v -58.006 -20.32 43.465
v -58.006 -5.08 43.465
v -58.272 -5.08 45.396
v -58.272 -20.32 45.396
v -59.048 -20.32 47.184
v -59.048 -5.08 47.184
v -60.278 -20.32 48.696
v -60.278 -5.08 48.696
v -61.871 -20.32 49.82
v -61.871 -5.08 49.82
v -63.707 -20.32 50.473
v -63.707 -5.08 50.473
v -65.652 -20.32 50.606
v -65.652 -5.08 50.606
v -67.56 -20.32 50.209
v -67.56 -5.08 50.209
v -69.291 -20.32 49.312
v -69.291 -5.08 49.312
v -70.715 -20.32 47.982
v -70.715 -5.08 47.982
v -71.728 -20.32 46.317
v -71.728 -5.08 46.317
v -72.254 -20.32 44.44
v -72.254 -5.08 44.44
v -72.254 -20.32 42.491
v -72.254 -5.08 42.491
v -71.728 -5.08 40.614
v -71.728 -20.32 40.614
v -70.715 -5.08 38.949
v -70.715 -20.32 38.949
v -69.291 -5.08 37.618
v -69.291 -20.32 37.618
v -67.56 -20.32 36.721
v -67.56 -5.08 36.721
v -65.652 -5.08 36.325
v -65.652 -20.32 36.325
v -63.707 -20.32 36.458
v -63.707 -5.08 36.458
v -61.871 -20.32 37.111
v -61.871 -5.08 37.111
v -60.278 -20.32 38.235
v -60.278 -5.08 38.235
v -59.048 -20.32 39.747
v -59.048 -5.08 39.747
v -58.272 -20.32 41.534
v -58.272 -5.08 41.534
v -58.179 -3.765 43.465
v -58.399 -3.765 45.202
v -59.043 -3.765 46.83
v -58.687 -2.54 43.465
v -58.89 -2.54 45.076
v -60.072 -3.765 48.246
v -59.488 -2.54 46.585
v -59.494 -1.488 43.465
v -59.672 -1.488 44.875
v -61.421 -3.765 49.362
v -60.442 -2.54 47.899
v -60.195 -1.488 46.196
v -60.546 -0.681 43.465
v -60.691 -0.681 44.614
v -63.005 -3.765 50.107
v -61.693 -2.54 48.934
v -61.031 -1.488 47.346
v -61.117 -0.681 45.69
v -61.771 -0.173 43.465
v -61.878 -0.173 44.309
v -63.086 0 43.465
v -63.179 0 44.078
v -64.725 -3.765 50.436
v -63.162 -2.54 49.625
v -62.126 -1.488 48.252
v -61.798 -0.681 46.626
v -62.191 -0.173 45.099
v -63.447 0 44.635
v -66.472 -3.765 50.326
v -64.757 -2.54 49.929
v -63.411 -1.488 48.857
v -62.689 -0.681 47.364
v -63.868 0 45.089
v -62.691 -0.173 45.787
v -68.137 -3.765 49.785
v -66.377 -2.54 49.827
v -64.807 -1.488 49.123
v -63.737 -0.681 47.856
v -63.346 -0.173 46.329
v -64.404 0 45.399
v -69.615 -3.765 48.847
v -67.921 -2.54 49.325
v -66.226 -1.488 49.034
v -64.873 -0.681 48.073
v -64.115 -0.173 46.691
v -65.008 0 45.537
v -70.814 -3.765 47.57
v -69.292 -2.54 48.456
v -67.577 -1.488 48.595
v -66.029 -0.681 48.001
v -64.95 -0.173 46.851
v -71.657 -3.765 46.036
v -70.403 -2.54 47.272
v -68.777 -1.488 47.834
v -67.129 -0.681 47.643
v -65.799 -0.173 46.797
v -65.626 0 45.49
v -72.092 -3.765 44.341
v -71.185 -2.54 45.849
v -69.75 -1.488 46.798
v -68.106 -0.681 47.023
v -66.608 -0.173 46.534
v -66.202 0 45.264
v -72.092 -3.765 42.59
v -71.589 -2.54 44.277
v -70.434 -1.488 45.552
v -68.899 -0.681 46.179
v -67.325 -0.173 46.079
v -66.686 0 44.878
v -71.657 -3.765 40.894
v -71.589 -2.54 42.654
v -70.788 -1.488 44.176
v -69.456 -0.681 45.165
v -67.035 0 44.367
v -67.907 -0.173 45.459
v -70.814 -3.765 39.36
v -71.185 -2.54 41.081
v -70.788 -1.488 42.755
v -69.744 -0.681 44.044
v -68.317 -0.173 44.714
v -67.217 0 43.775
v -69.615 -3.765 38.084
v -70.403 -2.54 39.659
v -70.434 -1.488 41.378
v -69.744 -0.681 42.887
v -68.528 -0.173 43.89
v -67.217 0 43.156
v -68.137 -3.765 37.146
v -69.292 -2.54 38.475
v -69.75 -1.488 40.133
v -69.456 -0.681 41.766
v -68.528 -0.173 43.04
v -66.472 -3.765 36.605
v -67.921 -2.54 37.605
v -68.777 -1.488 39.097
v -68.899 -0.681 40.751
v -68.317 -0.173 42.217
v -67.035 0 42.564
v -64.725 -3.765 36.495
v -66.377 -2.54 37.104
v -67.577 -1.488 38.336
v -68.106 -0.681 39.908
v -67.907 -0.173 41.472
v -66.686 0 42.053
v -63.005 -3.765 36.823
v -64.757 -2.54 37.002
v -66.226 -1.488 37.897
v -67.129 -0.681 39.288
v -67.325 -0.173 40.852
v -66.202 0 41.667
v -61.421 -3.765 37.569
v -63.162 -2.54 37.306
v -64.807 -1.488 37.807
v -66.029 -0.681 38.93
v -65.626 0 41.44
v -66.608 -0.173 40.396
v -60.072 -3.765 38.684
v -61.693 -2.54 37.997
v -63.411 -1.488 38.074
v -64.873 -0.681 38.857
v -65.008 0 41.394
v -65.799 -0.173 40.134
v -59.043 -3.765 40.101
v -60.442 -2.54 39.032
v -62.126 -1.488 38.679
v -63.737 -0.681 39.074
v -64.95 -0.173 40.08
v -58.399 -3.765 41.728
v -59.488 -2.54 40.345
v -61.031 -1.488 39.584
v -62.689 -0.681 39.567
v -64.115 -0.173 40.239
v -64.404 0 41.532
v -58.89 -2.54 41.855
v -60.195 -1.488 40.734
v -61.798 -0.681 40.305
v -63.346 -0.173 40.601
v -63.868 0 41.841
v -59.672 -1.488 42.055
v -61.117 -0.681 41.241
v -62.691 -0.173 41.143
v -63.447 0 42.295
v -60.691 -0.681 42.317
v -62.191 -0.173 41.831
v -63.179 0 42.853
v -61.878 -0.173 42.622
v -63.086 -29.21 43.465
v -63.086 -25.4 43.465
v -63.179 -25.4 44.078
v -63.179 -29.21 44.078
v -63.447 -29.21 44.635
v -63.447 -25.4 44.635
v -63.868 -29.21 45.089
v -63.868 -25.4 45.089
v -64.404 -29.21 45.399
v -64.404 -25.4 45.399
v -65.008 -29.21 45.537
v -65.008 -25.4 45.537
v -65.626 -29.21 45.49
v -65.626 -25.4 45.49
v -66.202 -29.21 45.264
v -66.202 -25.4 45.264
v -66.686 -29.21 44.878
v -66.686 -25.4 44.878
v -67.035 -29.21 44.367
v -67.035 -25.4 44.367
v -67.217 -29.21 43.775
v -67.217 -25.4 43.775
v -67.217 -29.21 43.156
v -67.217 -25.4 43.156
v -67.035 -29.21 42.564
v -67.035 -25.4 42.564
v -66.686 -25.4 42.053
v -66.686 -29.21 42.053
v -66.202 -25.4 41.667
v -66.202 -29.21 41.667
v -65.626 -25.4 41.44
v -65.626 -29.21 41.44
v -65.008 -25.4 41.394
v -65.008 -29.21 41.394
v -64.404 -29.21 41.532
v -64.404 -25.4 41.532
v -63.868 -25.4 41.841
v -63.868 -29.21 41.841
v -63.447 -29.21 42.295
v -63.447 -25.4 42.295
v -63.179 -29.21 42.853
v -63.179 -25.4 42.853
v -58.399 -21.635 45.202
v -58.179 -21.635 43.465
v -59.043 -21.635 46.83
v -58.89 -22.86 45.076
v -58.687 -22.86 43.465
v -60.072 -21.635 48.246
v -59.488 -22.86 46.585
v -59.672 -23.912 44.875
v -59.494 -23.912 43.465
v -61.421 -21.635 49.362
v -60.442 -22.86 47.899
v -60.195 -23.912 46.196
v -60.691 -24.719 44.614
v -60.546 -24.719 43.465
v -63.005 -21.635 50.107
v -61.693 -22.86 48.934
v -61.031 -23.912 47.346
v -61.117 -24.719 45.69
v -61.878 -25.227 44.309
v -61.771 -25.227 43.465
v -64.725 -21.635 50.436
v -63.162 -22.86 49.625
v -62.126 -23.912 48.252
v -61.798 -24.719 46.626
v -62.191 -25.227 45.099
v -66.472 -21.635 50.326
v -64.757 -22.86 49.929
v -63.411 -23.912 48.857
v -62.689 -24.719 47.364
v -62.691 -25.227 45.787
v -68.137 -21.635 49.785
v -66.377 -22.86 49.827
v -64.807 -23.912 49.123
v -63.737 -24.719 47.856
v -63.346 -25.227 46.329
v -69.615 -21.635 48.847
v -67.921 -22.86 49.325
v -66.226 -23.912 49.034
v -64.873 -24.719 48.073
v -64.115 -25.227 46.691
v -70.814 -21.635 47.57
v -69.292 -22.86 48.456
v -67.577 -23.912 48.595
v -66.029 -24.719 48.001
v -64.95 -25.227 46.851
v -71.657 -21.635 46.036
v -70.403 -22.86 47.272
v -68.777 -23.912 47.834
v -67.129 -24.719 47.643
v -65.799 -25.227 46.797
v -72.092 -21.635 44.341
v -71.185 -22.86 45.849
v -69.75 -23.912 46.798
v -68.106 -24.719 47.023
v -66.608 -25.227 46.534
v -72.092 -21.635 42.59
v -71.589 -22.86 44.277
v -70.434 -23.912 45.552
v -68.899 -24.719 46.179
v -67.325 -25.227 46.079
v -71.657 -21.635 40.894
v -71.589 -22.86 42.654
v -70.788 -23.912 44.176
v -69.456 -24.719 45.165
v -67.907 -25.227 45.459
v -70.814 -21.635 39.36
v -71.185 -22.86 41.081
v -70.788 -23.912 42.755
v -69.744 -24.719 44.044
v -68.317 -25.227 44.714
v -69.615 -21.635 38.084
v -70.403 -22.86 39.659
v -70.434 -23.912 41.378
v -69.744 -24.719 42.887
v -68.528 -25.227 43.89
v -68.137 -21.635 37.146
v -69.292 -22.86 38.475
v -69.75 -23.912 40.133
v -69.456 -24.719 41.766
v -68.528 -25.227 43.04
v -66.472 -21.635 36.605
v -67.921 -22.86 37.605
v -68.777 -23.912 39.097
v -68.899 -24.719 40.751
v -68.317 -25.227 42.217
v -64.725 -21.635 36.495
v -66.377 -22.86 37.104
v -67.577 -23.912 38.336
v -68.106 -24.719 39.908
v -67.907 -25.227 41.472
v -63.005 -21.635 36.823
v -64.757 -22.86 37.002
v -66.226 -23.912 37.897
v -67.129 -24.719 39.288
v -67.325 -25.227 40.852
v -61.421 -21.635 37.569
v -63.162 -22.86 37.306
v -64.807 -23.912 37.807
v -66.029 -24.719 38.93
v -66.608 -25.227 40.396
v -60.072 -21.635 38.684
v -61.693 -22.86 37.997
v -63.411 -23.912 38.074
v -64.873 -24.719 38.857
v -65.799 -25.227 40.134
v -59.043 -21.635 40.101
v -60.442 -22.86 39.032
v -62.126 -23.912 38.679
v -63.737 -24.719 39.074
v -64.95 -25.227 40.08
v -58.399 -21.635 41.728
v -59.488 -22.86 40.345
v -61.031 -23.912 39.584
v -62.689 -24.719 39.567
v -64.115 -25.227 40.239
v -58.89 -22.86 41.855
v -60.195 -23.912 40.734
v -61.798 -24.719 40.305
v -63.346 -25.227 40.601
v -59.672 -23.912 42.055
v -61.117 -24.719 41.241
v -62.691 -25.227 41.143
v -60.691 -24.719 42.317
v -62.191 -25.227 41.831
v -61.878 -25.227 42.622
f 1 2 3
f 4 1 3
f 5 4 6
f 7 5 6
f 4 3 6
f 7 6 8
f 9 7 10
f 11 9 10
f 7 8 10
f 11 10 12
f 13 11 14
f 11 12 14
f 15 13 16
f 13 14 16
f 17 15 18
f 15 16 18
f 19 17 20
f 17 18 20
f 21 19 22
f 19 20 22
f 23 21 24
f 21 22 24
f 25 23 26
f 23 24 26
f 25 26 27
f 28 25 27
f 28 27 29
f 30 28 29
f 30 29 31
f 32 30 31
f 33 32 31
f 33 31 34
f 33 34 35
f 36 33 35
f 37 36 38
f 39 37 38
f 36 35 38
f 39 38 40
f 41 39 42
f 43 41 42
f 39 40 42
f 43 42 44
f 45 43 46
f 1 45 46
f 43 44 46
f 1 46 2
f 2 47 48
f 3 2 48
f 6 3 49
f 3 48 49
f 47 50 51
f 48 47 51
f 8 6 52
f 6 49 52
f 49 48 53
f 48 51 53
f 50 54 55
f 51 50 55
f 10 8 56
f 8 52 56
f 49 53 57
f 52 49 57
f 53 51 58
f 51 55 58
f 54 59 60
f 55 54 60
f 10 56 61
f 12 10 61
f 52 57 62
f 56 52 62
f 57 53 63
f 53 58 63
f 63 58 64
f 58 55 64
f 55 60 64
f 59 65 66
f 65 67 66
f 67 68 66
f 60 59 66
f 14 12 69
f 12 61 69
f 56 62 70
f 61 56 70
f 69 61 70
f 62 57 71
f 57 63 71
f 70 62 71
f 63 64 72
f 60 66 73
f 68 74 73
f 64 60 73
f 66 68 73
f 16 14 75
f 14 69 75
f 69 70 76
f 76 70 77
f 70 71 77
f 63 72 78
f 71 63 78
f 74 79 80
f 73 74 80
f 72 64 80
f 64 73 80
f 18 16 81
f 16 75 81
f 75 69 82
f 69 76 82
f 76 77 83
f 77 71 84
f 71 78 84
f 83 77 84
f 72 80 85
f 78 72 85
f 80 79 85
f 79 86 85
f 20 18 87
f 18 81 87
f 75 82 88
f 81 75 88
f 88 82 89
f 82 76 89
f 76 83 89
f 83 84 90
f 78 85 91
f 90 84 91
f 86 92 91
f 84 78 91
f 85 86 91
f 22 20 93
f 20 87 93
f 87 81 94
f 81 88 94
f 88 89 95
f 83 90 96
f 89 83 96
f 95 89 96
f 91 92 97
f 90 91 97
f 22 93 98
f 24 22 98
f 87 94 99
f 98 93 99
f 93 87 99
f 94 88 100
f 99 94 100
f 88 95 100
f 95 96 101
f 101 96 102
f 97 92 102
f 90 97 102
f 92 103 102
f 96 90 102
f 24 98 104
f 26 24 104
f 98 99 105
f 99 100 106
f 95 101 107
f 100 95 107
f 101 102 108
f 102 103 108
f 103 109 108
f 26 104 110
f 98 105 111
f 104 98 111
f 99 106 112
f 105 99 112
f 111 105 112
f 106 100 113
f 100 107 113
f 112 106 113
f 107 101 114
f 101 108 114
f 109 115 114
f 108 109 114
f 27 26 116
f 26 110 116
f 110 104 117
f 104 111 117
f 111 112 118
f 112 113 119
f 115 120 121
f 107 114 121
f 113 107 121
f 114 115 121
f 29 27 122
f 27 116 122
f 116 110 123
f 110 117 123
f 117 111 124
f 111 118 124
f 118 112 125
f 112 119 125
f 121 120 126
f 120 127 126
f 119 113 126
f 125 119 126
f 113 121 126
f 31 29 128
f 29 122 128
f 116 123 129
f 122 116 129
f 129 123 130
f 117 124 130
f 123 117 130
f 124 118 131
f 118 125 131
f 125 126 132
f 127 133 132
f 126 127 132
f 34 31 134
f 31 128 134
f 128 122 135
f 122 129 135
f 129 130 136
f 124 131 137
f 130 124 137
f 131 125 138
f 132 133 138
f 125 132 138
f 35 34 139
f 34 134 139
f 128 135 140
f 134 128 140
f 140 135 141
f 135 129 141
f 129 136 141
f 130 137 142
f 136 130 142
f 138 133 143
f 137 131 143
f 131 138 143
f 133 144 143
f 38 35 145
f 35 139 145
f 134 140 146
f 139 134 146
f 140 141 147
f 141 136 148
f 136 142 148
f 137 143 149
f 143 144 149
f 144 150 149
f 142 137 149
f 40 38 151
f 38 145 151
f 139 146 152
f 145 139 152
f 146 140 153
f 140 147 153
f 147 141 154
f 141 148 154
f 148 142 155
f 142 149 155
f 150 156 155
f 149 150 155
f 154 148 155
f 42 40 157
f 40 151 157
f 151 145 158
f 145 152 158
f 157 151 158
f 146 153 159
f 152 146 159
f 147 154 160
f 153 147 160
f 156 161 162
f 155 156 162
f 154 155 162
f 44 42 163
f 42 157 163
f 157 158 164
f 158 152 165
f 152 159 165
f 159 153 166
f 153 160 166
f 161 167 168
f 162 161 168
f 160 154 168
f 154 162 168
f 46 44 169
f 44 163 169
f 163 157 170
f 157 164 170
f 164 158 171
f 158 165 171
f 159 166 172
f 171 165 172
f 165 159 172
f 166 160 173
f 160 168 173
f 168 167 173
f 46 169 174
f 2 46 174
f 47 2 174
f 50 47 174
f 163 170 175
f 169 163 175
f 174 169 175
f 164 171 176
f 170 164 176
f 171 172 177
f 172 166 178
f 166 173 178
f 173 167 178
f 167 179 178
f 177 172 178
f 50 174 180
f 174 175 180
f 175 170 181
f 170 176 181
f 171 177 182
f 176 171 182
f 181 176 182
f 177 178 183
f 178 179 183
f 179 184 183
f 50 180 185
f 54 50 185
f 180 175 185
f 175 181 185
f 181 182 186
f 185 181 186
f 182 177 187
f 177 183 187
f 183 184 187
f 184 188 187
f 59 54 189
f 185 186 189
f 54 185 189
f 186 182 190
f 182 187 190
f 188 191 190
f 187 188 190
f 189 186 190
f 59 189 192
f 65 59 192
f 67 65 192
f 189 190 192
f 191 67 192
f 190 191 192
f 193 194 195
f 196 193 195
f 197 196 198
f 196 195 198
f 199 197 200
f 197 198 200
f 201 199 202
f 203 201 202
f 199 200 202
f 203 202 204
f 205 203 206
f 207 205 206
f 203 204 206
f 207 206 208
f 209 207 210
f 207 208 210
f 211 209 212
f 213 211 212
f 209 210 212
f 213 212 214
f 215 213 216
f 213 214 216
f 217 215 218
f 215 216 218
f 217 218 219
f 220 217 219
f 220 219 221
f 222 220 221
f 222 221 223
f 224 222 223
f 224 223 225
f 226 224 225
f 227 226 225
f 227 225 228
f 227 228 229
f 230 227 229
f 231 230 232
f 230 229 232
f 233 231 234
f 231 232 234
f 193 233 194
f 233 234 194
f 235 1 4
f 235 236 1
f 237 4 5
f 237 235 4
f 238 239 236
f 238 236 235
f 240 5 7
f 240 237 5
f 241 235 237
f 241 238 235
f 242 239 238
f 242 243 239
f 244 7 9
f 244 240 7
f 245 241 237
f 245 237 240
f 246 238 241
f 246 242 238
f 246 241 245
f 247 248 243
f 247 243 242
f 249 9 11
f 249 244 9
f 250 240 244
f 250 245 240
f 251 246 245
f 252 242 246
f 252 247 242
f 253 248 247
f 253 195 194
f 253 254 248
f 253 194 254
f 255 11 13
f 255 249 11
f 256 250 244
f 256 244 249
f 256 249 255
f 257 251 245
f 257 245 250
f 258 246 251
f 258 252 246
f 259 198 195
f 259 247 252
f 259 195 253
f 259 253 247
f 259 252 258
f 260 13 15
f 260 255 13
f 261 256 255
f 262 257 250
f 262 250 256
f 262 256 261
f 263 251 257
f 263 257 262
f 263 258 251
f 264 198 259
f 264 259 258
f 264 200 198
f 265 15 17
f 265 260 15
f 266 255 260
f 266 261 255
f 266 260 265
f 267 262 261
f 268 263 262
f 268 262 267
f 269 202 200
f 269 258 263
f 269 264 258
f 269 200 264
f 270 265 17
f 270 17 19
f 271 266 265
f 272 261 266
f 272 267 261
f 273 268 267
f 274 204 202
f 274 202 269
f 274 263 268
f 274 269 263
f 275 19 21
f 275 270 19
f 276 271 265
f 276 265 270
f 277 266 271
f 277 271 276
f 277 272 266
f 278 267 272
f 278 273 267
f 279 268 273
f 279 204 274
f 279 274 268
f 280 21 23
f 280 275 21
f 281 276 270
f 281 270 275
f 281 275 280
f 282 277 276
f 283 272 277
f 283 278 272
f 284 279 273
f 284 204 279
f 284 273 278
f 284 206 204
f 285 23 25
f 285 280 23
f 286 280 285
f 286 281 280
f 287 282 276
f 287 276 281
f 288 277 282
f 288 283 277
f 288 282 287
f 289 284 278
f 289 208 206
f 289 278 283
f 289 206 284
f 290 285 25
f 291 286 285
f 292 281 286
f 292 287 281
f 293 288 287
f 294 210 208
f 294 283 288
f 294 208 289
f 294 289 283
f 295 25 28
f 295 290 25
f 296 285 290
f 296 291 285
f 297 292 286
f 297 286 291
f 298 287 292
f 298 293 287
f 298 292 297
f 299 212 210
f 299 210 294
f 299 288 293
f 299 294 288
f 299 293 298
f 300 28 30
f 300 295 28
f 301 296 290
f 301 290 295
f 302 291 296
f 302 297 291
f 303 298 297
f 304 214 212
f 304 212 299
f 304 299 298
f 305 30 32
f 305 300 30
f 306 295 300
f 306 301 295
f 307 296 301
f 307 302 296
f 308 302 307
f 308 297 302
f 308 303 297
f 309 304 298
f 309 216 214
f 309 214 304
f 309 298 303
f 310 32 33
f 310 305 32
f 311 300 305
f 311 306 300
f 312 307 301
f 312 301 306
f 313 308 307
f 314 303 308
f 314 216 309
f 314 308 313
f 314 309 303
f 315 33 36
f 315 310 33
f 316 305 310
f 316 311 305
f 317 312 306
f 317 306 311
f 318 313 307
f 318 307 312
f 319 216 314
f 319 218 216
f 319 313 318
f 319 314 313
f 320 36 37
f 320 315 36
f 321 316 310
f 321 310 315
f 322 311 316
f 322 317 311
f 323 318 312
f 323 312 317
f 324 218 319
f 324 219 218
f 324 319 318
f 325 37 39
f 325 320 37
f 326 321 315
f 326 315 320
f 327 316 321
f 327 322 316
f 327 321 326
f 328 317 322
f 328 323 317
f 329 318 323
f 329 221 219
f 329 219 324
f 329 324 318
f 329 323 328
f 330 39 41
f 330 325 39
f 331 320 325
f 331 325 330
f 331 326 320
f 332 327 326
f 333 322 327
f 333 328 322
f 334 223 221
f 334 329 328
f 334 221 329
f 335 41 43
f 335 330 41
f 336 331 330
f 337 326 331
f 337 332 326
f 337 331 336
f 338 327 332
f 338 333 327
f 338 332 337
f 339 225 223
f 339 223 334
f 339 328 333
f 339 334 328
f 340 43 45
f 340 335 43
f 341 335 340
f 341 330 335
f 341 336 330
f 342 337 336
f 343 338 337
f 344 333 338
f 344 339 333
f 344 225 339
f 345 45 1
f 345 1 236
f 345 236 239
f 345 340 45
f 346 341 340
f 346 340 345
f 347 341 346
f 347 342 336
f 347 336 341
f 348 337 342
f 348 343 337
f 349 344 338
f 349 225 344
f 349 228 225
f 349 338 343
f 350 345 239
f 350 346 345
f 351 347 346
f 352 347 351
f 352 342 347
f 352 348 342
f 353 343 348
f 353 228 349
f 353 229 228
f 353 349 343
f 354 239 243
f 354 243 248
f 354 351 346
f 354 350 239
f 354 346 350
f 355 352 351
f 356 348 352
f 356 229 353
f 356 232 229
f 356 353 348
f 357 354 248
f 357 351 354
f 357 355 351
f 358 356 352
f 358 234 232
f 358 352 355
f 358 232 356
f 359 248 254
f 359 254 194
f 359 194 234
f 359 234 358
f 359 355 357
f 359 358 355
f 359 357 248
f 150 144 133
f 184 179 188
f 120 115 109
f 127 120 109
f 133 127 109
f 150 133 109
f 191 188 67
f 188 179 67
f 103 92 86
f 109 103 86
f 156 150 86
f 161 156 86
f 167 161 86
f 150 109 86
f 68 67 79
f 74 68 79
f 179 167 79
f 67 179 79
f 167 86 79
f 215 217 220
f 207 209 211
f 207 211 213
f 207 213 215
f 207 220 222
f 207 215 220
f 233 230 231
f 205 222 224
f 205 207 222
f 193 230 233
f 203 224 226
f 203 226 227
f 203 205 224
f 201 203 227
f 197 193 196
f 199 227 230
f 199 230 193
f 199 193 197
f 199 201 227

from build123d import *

# Parameters (mm, degrees)
F0_R      = 7.157093
F1_DEPTH  = 25.4
F2_R      = 5.08
F1_FACE_R = 2.077093
F3_DEPTH  = 3.81


with BuildPart() as f1:
    # F0 (on Front) → F1 (new body)
    with BuildSketch(Plane.XZ):
        with Locations((-65.163344, 43.465324)):
            Circle(F0_R)
    extrude(amount=F1_DEPTH)

    # F2
    f2_edges = [f1.edges().sort_by_distance(p)[0] for p in [
        (-72.320437, -25.4, 43.465324),
        (-72.320437, 0, 43.465324),
    ]]
    fillet(f2_edges, radius=F2_R)

    # F1_face (on face) → F3 (join)
    with BuildSketch(Plane(origin=(-65.163344, -25.4, 43.465324), x_dir=(1, 0, 0), z_dir=(0, -1, 0))):
        Circle(F1_FACE_R)
    extrude(amount=F3_DEPTH)


solid = f1.part
